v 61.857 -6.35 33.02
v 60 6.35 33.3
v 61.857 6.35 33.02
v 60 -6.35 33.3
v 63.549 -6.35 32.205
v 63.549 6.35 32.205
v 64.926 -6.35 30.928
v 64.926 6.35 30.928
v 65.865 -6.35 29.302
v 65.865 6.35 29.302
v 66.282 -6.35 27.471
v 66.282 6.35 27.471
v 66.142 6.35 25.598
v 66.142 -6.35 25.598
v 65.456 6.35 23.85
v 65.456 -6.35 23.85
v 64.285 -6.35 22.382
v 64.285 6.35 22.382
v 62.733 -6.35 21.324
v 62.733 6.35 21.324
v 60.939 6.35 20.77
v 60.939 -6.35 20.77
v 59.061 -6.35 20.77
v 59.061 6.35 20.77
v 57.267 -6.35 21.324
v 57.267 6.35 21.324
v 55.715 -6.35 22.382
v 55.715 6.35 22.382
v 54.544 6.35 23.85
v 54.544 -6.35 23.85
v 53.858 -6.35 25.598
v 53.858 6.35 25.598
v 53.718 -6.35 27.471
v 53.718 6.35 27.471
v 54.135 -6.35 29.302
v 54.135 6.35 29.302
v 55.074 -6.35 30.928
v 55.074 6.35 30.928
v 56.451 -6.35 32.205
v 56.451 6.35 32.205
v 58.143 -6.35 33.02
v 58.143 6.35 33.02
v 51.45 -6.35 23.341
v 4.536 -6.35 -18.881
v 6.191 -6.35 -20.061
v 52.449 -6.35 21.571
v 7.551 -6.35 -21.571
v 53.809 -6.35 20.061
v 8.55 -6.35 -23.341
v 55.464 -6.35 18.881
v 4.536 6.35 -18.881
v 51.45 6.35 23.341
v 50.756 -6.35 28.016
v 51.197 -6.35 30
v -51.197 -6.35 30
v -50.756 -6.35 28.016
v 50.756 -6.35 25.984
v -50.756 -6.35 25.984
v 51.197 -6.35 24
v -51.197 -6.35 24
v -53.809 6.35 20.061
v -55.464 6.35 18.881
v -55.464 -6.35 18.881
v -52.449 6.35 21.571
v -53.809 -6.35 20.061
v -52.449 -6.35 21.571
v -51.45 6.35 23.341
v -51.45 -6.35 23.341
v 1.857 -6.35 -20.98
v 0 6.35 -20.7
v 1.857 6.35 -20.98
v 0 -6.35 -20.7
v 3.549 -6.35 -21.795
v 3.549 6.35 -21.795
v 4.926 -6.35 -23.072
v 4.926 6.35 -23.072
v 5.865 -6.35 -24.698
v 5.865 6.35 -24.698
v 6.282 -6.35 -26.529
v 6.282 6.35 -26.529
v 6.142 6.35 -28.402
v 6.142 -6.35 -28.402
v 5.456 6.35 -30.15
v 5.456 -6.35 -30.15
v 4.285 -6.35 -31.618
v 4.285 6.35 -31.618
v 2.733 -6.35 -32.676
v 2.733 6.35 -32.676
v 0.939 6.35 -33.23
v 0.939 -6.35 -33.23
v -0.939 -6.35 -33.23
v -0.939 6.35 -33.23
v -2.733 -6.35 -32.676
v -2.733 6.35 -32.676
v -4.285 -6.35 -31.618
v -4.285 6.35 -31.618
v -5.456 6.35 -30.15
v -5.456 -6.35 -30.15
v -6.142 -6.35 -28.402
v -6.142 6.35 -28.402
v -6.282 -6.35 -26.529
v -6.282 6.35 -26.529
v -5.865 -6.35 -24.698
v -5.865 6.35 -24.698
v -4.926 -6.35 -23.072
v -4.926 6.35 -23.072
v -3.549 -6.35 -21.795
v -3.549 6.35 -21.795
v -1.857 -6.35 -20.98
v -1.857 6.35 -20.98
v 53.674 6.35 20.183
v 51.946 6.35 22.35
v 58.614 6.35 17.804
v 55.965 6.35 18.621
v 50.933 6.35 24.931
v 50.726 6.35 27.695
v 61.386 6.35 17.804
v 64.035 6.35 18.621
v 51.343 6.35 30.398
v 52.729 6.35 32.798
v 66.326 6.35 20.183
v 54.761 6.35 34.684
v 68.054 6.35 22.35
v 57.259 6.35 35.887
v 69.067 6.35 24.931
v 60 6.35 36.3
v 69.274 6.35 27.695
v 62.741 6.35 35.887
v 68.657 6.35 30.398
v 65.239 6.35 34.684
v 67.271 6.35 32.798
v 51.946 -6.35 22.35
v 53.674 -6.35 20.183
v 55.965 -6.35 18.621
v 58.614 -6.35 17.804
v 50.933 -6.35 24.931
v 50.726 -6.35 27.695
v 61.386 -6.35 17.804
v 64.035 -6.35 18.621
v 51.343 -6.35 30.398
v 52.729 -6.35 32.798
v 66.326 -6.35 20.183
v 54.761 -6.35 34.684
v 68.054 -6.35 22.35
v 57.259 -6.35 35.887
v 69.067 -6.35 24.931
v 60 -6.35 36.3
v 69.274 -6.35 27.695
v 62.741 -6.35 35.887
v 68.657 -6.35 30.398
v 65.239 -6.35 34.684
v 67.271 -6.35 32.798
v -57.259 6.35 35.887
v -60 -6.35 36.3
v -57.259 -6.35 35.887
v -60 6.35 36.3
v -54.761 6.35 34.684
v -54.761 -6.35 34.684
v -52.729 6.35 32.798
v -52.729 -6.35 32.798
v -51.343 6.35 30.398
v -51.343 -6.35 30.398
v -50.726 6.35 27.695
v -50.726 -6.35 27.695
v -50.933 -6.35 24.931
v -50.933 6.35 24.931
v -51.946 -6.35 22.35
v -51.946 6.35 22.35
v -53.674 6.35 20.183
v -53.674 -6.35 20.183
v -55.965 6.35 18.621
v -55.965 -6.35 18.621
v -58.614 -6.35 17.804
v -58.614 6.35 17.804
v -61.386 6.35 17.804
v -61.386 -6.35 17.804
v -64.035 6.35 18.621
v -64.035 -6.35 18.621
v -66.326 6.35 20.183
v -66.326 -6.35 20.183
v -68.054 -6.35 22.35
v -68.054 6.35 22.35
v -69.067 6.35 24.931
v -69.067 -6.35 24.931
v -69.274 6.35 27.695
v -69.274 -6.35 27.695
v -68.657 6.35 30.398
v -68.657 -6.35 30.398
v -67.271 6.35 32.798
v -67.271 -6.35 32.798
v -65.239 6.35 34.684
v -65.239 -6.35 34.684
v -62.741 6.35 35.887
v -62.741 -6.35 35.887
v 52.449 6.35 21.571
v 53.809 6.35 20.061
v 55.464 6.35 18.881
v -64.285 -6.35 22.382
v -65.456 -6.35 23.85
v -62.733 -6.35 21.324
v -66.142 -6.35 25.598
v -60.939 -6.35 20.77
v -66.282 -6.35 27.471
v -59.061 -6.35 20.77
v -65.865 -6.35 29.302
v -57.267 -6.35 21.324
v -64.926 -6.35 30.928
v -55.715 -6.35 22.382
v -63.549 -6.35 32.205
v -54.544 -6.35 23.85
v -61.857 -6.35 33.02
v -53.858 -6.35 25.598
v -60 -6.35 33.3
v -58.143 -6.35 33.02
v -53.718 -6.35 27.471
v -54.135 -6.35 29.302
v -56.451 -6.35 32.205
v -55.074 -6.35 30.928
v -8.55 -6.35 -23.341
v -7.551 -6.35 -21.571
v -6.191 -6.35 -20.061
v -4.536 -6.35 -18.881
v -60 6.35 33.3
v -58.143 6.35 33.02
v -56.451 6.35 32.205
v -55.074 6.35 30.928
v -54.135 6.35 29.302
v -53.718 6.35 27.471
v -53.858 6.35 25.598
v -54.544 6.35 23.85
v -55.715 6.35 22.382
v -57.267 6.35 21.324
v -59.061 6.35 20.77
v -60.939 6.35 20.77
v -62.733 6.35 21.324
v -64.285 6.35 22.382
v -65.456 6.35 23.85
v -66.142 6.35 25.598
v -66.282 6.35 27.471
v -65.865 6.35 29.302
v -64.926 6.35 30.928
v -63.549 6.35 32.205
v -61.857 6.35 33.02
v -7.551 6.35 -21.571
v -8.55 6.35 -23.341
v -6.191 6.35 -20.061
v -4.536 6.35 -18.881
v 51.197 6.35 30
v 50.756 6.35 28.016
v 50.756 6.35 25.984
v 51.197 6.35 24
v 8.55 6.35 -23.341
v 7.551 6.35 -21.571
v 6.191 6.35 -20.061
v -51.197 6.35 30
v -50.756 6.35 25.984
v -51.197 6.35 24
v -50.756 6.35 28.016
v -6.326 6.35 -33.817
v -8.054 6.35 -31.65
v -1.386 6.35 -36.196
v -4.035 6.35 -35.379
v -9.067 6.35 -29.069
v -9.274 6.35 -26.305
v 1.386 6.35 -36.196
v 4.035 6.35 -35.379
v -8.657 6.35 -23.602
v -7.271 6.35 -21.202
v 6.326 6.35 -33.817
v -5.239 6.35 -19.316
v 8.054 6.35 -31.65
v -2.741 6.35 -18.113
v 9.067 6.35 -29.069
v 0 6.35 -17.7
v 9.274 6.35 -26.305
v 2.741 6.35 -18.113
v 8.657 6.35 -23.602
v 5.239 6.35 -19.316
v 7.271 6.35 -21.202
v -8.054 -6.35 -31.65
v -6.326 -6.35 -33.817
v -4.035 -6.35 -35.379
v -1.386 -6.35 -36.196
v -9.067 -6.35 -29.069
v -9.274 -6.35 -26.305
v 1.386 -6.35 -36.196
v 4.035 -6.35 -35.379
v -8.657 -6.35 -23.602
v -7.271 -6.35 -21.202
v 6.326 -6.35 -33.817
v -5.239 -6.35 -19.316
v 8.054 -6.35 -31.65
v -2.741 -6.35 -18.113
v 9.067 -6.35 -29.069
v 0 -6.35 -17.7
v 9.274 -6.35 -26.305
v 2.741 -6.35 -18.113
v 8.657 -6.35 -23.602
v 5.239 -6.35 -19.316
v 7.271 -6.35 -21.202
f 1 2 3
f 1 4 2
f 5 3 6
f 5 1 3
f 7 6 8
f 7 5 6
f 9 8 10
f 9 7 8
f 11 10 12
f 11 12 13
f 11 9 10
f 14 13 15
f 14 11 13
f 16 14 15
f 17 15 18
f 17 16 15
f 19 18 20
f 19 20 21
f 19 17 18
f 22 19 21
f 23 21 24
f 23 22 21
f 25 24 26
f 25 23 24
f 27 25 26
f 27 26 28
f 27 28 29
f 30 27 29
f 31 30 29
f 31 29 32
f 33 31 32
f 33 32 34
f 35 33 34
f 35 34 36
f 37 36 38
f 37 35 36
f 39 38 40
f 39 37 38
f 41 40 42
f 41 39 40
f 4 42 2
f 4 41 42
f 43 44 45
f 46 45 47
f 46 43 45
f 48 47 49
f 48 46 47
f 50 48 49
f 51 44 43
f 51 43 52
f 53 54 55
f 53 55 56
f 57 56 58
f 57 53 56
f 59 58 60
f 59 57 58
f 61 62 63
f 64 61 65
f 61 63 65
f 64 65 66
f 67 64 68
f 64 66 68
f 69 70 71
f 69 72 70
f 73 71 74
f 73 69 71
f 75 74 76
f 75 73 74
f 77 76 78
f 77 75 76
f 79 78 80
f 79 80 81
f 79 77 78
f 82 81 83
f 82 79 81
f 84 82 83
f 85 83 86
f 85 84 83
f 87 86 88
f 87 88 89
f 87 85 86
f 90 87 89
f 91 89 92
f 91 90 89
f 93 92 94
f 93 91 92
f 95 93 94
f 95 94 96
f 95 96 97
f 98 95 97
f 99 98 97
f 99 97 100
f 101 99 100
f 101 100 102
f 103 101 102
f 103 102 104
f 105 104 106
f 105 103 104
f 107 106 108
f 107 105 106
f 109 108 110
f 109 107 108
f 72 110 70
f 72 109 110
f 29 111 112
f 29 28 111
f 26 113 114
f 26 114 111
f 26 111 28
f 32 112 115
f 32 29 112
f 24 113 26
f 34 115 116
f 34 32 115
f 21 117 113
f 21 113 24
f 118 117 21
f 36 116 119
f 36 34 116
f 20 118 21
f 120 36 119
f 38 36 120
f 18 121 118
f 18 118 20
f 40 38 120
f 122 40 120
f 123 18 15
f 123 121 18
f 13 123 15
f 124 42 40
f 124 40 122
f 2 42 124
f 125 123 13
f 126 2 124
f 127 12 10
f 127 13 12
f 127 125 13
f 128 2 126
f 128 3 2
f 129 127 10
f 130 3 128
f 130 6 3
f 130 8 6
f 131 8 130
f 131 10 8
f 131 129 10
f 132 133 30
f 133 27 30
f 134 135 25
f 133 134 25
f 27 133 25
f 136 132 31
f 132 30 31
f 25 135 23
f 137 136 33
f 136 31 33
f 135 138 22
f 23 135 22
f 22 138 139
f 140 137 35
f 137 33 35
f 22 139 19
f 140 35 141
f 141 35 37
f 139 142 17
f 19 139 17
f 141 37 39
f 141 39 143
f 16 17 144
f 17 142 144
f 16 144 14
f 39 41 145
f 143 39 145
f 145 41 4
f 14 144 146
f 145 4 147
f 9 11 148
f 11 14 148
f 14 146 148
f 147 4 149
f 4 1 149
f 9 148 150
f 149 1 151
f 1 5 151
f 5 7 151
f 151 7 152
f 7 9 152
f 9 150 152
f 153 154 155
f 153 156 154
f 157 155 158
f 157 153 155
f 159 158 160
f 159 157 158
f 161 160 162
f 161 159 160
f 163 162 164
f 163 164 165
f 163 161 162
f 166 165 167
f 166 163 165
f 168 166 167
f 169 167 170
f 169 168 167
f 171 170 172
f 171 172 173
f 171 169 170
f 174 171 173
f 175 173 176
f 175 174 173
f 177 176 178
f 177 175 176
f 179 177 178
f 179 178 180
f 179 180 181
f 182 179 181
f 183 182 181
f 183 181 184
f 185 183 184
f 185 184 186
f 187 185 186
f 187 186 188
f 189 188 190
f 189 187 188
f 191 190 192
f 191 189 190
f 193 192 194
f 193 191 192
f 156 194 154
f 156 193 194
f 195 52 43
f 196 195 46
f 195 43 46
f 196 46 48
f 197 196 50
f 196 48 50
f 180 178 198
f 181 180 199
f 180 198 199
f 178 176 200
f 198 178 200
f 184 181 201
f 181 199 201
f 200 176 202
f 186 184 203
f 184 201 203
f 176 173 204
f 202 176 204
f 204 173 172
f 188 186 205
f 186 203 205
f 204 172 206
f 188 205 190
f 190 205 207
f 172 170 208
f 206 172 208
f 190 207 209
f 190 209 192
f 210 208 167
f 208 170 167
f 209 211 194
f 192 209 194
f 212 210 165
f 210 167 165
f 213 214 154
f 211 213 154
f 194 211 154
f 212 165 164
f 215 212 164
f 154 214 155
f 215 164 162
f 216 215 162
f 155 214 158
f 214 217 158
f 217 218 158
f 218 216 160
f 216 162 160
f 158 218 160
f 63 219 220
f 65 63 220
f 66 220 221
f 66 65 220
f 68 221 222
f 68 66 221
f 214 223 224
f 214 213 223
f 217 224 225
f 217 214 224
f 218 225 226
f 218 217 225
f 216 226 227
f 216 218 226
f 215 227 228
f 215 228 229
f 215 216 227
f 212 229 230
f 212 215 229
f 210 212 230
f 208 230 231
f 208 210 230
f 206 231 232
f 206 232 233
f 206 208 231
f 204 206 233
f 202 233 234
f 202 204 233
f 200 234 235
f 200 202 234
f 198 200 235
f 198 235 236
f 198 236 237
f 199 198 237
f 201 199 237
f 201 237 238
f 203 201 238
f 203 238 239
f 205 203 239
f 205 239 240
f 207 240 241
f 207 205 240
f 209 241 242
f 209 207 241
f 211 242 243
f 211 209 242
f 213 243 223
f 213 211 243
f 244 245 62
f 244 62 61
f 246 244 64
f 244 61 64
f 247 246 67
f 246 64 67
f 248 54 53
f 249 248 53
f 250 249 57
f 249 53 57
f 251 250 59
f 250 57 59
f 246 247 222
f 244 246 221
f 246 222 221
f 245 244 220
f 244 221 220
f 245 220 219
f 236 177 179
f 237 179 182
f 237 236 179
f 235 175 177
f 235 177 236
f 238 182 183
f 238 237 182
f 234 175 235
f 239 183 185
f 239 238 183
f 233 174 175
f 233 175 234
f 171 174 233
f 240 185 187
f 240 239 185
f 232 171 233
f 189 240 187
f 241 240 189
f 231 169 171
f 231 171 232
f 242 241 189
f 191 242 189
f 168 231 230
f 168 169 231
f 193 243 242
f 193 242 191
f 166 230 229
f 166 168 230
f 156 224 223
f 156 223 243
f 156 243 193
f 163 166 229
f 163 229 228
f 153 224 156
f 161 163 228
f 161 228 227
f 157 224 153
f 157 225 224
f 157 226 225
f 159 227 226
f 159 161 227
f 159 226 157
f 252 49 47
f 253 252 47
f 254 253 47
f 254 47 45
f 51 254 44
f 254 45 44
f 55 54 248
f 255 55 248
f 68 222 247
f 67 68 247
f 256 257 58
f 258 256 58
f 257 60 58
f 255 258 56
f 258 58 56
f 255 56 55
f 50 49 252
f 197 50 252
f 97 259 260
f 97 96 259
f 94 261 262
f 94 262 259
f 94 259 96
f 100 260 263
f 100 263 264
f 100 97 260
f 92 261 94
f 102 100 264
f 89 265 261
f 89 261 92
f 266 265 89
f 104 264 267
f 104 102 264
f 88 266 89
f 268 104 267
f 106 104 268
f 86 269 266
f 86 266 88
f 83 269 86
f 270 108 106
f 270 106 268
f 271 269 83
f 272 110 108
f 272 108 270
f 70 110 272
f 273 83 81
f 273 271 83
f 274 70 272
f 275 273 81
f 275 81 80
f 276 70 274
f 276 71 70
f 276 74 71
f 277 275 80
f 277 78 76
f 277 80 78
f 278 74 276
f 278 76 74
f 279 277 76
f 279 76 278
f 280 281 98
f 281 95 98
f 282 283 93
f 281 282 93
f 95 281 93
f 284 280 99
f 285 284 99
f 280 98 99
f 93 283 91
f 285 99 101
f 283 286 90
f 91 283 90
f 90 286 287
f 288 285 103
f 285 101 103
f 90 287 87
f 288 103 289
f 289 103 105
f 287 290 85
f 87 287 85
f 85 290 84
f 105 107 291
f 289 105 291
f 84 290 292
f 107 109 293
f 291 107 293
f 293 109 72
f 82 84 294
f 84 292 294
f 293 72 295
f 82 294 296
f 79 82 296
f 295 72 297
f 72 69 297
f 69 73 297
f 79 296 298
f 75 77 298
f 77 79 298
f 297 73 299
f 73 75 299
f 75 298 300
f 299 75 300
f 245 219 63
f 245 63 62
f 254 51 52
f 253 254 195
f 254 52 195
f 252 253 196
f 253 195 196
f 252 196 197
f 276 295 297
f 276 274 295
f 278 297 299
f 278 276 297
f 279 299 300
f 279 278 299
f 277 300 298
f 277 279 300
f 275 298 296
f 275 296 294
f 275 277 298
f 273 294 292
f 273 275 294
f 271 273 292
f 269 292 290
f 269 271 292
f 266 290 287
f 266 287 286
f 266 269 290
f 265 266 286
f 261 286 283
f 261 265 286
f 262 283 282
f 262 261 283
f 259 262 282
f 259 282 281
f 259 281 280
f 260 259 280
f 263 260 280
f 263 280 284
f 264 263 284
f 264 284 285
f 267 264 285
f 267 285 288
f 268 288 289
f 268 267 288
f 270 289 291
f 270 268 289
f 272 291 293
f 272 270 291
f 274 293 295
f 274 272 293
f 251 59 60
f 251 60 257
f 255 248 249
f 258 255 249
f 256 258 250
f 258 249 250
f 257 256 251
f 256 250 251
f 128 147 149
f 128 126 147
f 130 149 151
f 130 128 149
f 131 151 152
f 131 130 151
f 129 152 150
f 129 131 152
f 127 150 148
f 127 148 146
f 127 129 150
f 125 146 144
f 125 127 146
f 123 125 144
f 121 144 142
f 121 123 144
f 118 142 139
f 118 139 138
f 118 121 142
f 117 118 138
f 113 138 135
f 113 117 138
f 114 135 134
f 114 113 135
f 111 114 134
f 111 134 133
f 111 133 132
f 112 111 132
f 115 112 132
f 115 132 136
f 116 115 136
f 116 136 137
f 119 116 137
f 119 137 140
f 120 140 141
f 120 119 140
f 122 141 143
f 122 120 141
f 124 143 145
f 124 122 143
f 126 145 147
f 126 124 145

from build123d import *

# Parameters (mm, degrees)
SKETCH2_R                            = 9.3
SKETCH2_R_2                          = 6.3
BOSS_EXTRUDE1_DEPTH                  = 6.35
BOSS_EXTRUDE1_2_DEPTH                = 6.35
BOSS_EXTRUDE1_3_DEPTH                = 6.35
BOSS_EXTRUDE3_REACH                  = 80.489
BOSS_EXTRUDE3_END_RADIUS             = 9.3
SKETCH8_W                            = 6
SKETCH8_H                            = 12.7
BOSS_EXTRUDE3_DIRECTION_2_REACH      = 80.489
BOSS_EXTRUDE3_DIRECTION_2_END_RADIUS = 9.3
BOSS_EXTRUDE4_REACH                  = 88.98
BOSS_EXTRUDE4_END_RADIUS             = 9.3
SKETCH4_W                            = 6
SKETCH4_H                            = 12.7
BOSS_EXTRUDE4_DIRECTION_2_REACH      = 88.98
BOSS_EXTRUDE4_DIRECTION_2_END_RADIUS = 9.3
BOSS_EXTRUDE5_REACH                  = 88.98
BOSS_EXTRUDE5_END_RADIUS             = 9.3
SKETCH3_W                            = 6
SKETCH3_H                            = 12.7
BOSS_EXTRUDE5_DIRECTION_2_REACH      = 88.98
BOSS_EXTRUDE5_DIRECTION_2_END_RADIUS = 9.3


with BuildPart() as part:
    # Sketch2 → Boss-Extrude1 (new, symmetric)
    with BuildSketch(Plane(origin=(0, 0, 0), x_dir=(1, 0, 0), z_dir=(0, 1, 0))):
        with Locations(Location((60, -27, 0), (0, 0, 270))):
            Circle(SKETCH2_R)
        with Locations(Location((60, -27, 0), (0, 0, 270))):
            Circle(SKETCH2_R_2, mode=Mode.SUBTRACT)
    extrude(amount=BOSS_EXTRUDE1_DEPTH, both=True)


with BuildPart() as body_2:
    # Sketch2 → Boss-Extrude1 2 (new, symmetric)
    with BuildSketch(Plane(origin=(0, 0, 0), x_dir=(1, 0, 0), z_dir=(0, 1, 0))):
        with Locations(Location((0, 27, 0), (0, 0, 270))):
            Circle(SKETCH2_R)
        with Locations(Location((0, 27, 0), (0, 0, 270))):
            Circle(SKETCH2_R_2, mode=Mode.SUBTRACT)
    extrude(amount=BOSS_EXTRUDE1_2_DEPTH, both=True)


with BuildPart() as body_3:
    # Sketch2 → Boss-Extrude1 3 (new, symmetric)
    with BuildSketch(Plane(origin=(0, 0, 0), x_dir=(1, 0, 0), z_dir=(0, 1, 0))):
        with Locations(Location((-60, -27, 0), (0, 0, 270))):
            Circle(SKETCH2_R)
        with Locations(Location((-60, -27, 0), (0, 0, 270))):
            Circle(SKETCH2_R_2, mode=Mode.SUBTRACT)
    extrude(amount=BOSS_EXTRUDE1_3_DEPTH, both=True)


with BuildPart() as body_4:
    # Boss-Extrude3: up to this cylinder (the profile starts outside it)
    boss_extrude3_end = Plane(origin=(60, 0, 27), z_dir=(0, -1, 0)) * Cylinder(BOSS_EXTRUDE3_END_RADIUS, 180.578, mode=Mode.PRIVATE)
    # Sketch8 → Boss-Extrude3 (new, up to the surface)
    with BuildSketch(Plane(origin=(0, 0, 0), x_dir=(0, 0, -1), z_dir=(1, 0, 0)), mode=Mode.PRIVATE) as boss_extrude3_sk1:
        with Locations((-27, 0)):
            Rectangle(SKETCH8_W, SKETCH8_H)
    boss_extrude3_tool1 = extrude(boss_extrude3_sk1.sketch, amount=BOSS_EXTRUDE3_REACH, mode=Mode.PRIVATE) - boss_extrude3_end
    add(boss_extrude3_tool1.solids().sort_by_distance((0, 0, 27))[0])

    # Boss-Extrude3 direction 2: up to this cylinder (the profile starts outside it)
    boss_extrude3_direction_2_end = Plane(origin=(-60, 0, 27), z_dir=(0, -1, 0)) * Cylinder(BOSS_EXTRUDE3_DIRECTION_2_END_RADIUS, 180.578, mode=Mode.PRIVATE)
    # Sketch8 → Boss-Extrude3 direction 2 (add, up to the surface)
    with BuildSketch(Plane(origin=(0, 0, 0), x_dir=(0, 0, -1), z_dir=(1, 0, 0)), mode=Mode.PRIVATE) as boss_extrude3_direction_2_sk1:
        with Locations((-27, 0)):
            Rectangle(SKETCH8_W, SKETCH8_H)
    boss_extrude3_direction_2_tool1 = extrude(boss_extrude3_direction_2_sk1.sketch, amount=-BOSS_EXTRUDE3_DIRECTION_2_REACH, mode=Mode.PRIVATE) - boss_extrude3_direction_2_end
    add(boss_extrude3_direction_2_tool1.solids().sort_by_distance((0, 0, 27))[0])


with BuildPart() as body_5:
    # Boss-Extrude4: up to this cylinder (the profile starts outside it)
    boss_extrude4_end = Plane(origin=(-60, 0, 27), z_dir=(0, -1, 0)) * Cylinder(BOSS_EXTRUDE4_END_RADIUS, 197.56, mode=Mode.PRIVATE)
    # Sketch4 → Boss-Extrude4 (new, up to the surface)
    with BuildSketch(Plane(origin=(6.512778805, 0, -5.861500924), x_dir=(0.6689647316224497, 0, 0.7432941462471663), z_dir=(-0.7432941462471663, 0, 0.6689647316224497)), mode=Mode.PRIVATE) as boss_extrude4_sk1:
        with Locations((-20.068941949, 0)):
            Rectangle(SKETCH4_W, SKETCH4_H)
    boss_extrude4_tool1 = extrude(boss_extrude4_sk1.sketch, amount=BOSS_EXTRUDE4_REACH, mode=Mode.PRIVATE) - boss_extrude4_end
    add(boss_extrude4_tool1.solids().sort_by_distance((-6.912636, 0, -20.778628))[0])

    # Boss-Extrude4 direction 2: up to this cylinder (the profile starts outside it)
    boss_extrude4_direction_2_end = Plane(origin=(0, 0, -27), z_dir=(0, -1, 0)) * Cylinder(BOSS_EXTRUDE4_DIRECTION_2_END_RADIUS, 197.56, mode=Mode.PRIVATE)
    # Sketch4 → Boss-Extrude4 direction 2 (add, up to the surface)
    with BuildSketch(Plane(origin=(6.512778805, 0, -5.861500924), x_dir=(0.6689647316224497, 0, 0.7432941462471663), z_dir=(-0.7432941462471663, 0, 0.6689647316224497)), mode=Mode.PRIVATE) as boss_extrude4_direction_2_sk1:
        with Locations((-20.068941949, 0)):
            Rectangle(SKETCH4_W, SKETCH4_H)
    boss_extrude4_direction_2_tool1 = extrude(boss_extrude4_direction_2_sk1.sketch, amount=-BOSS_EXTRUDE4_DIRECTION_2_REACH, mode=Mode.PRIVATE) - boss_extrude4_direction_2_end
    add(boss_extrude4_direction_2_tool1.solids().sort_by_distance((-6.912636, 0, -20.778628))[0])
    add(boss_extrude4_direction_2_tool1.solids().sort_by_distance((-6.912636, 0, -20.778628))[1])


with BuildPart() as body_6:
    # Boss-Extrude5: up to this cylinder (the profile starts outside it)
    boss_extrude5_end = Plane(origin=(60, 0, 27), z_dir=(0, -1, 0)) * Cylinder(BOSS_EXTRUDE5_END_RADIUS, 197.56, mode=Mode.PRIVATE)
    # Sketch3 → Boss-Extrude5 (new, up to the surface)
    with BuildSketch(Plane(origin=(-6.512778805, 0, -5.861500924), x_dir=(0.6689647316224495, 0, -0.7432941462471665), z_dir=(0.7432941462471665, 0, 0.6689647316224495)), mode=Mode.PRIVATE) as boss_extrude5_sk1:
        with Locations((20.068941949, 0)):
            Rectangle(SKETCH3_W, SKETCH3_H)
    boss_extrude5_tool1 = extrude(boss_extrude5_sk1.sketch, amount=BOSS_EXTRUDE5_REACH, mode=Mode.PRIVATE) - boss_extrude5_end
    add(boss_extrude5_tool1.solids().sort_by_distance((6.912636, 0, -20.778628))[0])

    # Boss-Extrude5 direction 2: up to this cylinder (the profile starts outside it)
    boss_extrude5_direction_2_end = Plane(origin=(0, 0, -27), z_dir=(0, -1, 0)) * Cylinder(BOSS_EXTRUDE5_DIRECTION_2_END_RADIUS, 197.56, mode=Mode.PRIVATE)
    # Sketch3 → Boss-Extrude5 direction 2 (add, up to the surface)
    with BuildSketch(Plane(origin=(-6.512778805, 0, -5.861500924), x_dir=(0.6689647316224495, 0, -0.7432941462471665), z_dir=(0.7432941462471665, 0, 0.6689647316224495)), mode=Mode.PRIVATE) as boss_extrude5_direction_2_sk1:
        with Locations((20.068941949, 0)):
            Rectangle(SKETCH3_W, SKETCH3_H)
    boss_extrude5_direction_2_tool1 = extrude(boss_extrude5_direction_2_sk1.sketch, amount=-BOSS_EXTRUDE5_DIRECTION_2_REACH, mode=Mode.PRIVATE) - boss_extrude5_direction_2_end
    add(boss_extrude5_direction_2_tool1.solids().sort_by_distance((6.912636, 0, -20.778628))[0])
    add(boss_extrude5_direction_2_tool1.solids().sort_by_distance((6.912636, 0, -20.778628))[1])


solid = Compound([part.part, body_2.part, body_3.part, body_4.part, body_5.part, body_6.part])
